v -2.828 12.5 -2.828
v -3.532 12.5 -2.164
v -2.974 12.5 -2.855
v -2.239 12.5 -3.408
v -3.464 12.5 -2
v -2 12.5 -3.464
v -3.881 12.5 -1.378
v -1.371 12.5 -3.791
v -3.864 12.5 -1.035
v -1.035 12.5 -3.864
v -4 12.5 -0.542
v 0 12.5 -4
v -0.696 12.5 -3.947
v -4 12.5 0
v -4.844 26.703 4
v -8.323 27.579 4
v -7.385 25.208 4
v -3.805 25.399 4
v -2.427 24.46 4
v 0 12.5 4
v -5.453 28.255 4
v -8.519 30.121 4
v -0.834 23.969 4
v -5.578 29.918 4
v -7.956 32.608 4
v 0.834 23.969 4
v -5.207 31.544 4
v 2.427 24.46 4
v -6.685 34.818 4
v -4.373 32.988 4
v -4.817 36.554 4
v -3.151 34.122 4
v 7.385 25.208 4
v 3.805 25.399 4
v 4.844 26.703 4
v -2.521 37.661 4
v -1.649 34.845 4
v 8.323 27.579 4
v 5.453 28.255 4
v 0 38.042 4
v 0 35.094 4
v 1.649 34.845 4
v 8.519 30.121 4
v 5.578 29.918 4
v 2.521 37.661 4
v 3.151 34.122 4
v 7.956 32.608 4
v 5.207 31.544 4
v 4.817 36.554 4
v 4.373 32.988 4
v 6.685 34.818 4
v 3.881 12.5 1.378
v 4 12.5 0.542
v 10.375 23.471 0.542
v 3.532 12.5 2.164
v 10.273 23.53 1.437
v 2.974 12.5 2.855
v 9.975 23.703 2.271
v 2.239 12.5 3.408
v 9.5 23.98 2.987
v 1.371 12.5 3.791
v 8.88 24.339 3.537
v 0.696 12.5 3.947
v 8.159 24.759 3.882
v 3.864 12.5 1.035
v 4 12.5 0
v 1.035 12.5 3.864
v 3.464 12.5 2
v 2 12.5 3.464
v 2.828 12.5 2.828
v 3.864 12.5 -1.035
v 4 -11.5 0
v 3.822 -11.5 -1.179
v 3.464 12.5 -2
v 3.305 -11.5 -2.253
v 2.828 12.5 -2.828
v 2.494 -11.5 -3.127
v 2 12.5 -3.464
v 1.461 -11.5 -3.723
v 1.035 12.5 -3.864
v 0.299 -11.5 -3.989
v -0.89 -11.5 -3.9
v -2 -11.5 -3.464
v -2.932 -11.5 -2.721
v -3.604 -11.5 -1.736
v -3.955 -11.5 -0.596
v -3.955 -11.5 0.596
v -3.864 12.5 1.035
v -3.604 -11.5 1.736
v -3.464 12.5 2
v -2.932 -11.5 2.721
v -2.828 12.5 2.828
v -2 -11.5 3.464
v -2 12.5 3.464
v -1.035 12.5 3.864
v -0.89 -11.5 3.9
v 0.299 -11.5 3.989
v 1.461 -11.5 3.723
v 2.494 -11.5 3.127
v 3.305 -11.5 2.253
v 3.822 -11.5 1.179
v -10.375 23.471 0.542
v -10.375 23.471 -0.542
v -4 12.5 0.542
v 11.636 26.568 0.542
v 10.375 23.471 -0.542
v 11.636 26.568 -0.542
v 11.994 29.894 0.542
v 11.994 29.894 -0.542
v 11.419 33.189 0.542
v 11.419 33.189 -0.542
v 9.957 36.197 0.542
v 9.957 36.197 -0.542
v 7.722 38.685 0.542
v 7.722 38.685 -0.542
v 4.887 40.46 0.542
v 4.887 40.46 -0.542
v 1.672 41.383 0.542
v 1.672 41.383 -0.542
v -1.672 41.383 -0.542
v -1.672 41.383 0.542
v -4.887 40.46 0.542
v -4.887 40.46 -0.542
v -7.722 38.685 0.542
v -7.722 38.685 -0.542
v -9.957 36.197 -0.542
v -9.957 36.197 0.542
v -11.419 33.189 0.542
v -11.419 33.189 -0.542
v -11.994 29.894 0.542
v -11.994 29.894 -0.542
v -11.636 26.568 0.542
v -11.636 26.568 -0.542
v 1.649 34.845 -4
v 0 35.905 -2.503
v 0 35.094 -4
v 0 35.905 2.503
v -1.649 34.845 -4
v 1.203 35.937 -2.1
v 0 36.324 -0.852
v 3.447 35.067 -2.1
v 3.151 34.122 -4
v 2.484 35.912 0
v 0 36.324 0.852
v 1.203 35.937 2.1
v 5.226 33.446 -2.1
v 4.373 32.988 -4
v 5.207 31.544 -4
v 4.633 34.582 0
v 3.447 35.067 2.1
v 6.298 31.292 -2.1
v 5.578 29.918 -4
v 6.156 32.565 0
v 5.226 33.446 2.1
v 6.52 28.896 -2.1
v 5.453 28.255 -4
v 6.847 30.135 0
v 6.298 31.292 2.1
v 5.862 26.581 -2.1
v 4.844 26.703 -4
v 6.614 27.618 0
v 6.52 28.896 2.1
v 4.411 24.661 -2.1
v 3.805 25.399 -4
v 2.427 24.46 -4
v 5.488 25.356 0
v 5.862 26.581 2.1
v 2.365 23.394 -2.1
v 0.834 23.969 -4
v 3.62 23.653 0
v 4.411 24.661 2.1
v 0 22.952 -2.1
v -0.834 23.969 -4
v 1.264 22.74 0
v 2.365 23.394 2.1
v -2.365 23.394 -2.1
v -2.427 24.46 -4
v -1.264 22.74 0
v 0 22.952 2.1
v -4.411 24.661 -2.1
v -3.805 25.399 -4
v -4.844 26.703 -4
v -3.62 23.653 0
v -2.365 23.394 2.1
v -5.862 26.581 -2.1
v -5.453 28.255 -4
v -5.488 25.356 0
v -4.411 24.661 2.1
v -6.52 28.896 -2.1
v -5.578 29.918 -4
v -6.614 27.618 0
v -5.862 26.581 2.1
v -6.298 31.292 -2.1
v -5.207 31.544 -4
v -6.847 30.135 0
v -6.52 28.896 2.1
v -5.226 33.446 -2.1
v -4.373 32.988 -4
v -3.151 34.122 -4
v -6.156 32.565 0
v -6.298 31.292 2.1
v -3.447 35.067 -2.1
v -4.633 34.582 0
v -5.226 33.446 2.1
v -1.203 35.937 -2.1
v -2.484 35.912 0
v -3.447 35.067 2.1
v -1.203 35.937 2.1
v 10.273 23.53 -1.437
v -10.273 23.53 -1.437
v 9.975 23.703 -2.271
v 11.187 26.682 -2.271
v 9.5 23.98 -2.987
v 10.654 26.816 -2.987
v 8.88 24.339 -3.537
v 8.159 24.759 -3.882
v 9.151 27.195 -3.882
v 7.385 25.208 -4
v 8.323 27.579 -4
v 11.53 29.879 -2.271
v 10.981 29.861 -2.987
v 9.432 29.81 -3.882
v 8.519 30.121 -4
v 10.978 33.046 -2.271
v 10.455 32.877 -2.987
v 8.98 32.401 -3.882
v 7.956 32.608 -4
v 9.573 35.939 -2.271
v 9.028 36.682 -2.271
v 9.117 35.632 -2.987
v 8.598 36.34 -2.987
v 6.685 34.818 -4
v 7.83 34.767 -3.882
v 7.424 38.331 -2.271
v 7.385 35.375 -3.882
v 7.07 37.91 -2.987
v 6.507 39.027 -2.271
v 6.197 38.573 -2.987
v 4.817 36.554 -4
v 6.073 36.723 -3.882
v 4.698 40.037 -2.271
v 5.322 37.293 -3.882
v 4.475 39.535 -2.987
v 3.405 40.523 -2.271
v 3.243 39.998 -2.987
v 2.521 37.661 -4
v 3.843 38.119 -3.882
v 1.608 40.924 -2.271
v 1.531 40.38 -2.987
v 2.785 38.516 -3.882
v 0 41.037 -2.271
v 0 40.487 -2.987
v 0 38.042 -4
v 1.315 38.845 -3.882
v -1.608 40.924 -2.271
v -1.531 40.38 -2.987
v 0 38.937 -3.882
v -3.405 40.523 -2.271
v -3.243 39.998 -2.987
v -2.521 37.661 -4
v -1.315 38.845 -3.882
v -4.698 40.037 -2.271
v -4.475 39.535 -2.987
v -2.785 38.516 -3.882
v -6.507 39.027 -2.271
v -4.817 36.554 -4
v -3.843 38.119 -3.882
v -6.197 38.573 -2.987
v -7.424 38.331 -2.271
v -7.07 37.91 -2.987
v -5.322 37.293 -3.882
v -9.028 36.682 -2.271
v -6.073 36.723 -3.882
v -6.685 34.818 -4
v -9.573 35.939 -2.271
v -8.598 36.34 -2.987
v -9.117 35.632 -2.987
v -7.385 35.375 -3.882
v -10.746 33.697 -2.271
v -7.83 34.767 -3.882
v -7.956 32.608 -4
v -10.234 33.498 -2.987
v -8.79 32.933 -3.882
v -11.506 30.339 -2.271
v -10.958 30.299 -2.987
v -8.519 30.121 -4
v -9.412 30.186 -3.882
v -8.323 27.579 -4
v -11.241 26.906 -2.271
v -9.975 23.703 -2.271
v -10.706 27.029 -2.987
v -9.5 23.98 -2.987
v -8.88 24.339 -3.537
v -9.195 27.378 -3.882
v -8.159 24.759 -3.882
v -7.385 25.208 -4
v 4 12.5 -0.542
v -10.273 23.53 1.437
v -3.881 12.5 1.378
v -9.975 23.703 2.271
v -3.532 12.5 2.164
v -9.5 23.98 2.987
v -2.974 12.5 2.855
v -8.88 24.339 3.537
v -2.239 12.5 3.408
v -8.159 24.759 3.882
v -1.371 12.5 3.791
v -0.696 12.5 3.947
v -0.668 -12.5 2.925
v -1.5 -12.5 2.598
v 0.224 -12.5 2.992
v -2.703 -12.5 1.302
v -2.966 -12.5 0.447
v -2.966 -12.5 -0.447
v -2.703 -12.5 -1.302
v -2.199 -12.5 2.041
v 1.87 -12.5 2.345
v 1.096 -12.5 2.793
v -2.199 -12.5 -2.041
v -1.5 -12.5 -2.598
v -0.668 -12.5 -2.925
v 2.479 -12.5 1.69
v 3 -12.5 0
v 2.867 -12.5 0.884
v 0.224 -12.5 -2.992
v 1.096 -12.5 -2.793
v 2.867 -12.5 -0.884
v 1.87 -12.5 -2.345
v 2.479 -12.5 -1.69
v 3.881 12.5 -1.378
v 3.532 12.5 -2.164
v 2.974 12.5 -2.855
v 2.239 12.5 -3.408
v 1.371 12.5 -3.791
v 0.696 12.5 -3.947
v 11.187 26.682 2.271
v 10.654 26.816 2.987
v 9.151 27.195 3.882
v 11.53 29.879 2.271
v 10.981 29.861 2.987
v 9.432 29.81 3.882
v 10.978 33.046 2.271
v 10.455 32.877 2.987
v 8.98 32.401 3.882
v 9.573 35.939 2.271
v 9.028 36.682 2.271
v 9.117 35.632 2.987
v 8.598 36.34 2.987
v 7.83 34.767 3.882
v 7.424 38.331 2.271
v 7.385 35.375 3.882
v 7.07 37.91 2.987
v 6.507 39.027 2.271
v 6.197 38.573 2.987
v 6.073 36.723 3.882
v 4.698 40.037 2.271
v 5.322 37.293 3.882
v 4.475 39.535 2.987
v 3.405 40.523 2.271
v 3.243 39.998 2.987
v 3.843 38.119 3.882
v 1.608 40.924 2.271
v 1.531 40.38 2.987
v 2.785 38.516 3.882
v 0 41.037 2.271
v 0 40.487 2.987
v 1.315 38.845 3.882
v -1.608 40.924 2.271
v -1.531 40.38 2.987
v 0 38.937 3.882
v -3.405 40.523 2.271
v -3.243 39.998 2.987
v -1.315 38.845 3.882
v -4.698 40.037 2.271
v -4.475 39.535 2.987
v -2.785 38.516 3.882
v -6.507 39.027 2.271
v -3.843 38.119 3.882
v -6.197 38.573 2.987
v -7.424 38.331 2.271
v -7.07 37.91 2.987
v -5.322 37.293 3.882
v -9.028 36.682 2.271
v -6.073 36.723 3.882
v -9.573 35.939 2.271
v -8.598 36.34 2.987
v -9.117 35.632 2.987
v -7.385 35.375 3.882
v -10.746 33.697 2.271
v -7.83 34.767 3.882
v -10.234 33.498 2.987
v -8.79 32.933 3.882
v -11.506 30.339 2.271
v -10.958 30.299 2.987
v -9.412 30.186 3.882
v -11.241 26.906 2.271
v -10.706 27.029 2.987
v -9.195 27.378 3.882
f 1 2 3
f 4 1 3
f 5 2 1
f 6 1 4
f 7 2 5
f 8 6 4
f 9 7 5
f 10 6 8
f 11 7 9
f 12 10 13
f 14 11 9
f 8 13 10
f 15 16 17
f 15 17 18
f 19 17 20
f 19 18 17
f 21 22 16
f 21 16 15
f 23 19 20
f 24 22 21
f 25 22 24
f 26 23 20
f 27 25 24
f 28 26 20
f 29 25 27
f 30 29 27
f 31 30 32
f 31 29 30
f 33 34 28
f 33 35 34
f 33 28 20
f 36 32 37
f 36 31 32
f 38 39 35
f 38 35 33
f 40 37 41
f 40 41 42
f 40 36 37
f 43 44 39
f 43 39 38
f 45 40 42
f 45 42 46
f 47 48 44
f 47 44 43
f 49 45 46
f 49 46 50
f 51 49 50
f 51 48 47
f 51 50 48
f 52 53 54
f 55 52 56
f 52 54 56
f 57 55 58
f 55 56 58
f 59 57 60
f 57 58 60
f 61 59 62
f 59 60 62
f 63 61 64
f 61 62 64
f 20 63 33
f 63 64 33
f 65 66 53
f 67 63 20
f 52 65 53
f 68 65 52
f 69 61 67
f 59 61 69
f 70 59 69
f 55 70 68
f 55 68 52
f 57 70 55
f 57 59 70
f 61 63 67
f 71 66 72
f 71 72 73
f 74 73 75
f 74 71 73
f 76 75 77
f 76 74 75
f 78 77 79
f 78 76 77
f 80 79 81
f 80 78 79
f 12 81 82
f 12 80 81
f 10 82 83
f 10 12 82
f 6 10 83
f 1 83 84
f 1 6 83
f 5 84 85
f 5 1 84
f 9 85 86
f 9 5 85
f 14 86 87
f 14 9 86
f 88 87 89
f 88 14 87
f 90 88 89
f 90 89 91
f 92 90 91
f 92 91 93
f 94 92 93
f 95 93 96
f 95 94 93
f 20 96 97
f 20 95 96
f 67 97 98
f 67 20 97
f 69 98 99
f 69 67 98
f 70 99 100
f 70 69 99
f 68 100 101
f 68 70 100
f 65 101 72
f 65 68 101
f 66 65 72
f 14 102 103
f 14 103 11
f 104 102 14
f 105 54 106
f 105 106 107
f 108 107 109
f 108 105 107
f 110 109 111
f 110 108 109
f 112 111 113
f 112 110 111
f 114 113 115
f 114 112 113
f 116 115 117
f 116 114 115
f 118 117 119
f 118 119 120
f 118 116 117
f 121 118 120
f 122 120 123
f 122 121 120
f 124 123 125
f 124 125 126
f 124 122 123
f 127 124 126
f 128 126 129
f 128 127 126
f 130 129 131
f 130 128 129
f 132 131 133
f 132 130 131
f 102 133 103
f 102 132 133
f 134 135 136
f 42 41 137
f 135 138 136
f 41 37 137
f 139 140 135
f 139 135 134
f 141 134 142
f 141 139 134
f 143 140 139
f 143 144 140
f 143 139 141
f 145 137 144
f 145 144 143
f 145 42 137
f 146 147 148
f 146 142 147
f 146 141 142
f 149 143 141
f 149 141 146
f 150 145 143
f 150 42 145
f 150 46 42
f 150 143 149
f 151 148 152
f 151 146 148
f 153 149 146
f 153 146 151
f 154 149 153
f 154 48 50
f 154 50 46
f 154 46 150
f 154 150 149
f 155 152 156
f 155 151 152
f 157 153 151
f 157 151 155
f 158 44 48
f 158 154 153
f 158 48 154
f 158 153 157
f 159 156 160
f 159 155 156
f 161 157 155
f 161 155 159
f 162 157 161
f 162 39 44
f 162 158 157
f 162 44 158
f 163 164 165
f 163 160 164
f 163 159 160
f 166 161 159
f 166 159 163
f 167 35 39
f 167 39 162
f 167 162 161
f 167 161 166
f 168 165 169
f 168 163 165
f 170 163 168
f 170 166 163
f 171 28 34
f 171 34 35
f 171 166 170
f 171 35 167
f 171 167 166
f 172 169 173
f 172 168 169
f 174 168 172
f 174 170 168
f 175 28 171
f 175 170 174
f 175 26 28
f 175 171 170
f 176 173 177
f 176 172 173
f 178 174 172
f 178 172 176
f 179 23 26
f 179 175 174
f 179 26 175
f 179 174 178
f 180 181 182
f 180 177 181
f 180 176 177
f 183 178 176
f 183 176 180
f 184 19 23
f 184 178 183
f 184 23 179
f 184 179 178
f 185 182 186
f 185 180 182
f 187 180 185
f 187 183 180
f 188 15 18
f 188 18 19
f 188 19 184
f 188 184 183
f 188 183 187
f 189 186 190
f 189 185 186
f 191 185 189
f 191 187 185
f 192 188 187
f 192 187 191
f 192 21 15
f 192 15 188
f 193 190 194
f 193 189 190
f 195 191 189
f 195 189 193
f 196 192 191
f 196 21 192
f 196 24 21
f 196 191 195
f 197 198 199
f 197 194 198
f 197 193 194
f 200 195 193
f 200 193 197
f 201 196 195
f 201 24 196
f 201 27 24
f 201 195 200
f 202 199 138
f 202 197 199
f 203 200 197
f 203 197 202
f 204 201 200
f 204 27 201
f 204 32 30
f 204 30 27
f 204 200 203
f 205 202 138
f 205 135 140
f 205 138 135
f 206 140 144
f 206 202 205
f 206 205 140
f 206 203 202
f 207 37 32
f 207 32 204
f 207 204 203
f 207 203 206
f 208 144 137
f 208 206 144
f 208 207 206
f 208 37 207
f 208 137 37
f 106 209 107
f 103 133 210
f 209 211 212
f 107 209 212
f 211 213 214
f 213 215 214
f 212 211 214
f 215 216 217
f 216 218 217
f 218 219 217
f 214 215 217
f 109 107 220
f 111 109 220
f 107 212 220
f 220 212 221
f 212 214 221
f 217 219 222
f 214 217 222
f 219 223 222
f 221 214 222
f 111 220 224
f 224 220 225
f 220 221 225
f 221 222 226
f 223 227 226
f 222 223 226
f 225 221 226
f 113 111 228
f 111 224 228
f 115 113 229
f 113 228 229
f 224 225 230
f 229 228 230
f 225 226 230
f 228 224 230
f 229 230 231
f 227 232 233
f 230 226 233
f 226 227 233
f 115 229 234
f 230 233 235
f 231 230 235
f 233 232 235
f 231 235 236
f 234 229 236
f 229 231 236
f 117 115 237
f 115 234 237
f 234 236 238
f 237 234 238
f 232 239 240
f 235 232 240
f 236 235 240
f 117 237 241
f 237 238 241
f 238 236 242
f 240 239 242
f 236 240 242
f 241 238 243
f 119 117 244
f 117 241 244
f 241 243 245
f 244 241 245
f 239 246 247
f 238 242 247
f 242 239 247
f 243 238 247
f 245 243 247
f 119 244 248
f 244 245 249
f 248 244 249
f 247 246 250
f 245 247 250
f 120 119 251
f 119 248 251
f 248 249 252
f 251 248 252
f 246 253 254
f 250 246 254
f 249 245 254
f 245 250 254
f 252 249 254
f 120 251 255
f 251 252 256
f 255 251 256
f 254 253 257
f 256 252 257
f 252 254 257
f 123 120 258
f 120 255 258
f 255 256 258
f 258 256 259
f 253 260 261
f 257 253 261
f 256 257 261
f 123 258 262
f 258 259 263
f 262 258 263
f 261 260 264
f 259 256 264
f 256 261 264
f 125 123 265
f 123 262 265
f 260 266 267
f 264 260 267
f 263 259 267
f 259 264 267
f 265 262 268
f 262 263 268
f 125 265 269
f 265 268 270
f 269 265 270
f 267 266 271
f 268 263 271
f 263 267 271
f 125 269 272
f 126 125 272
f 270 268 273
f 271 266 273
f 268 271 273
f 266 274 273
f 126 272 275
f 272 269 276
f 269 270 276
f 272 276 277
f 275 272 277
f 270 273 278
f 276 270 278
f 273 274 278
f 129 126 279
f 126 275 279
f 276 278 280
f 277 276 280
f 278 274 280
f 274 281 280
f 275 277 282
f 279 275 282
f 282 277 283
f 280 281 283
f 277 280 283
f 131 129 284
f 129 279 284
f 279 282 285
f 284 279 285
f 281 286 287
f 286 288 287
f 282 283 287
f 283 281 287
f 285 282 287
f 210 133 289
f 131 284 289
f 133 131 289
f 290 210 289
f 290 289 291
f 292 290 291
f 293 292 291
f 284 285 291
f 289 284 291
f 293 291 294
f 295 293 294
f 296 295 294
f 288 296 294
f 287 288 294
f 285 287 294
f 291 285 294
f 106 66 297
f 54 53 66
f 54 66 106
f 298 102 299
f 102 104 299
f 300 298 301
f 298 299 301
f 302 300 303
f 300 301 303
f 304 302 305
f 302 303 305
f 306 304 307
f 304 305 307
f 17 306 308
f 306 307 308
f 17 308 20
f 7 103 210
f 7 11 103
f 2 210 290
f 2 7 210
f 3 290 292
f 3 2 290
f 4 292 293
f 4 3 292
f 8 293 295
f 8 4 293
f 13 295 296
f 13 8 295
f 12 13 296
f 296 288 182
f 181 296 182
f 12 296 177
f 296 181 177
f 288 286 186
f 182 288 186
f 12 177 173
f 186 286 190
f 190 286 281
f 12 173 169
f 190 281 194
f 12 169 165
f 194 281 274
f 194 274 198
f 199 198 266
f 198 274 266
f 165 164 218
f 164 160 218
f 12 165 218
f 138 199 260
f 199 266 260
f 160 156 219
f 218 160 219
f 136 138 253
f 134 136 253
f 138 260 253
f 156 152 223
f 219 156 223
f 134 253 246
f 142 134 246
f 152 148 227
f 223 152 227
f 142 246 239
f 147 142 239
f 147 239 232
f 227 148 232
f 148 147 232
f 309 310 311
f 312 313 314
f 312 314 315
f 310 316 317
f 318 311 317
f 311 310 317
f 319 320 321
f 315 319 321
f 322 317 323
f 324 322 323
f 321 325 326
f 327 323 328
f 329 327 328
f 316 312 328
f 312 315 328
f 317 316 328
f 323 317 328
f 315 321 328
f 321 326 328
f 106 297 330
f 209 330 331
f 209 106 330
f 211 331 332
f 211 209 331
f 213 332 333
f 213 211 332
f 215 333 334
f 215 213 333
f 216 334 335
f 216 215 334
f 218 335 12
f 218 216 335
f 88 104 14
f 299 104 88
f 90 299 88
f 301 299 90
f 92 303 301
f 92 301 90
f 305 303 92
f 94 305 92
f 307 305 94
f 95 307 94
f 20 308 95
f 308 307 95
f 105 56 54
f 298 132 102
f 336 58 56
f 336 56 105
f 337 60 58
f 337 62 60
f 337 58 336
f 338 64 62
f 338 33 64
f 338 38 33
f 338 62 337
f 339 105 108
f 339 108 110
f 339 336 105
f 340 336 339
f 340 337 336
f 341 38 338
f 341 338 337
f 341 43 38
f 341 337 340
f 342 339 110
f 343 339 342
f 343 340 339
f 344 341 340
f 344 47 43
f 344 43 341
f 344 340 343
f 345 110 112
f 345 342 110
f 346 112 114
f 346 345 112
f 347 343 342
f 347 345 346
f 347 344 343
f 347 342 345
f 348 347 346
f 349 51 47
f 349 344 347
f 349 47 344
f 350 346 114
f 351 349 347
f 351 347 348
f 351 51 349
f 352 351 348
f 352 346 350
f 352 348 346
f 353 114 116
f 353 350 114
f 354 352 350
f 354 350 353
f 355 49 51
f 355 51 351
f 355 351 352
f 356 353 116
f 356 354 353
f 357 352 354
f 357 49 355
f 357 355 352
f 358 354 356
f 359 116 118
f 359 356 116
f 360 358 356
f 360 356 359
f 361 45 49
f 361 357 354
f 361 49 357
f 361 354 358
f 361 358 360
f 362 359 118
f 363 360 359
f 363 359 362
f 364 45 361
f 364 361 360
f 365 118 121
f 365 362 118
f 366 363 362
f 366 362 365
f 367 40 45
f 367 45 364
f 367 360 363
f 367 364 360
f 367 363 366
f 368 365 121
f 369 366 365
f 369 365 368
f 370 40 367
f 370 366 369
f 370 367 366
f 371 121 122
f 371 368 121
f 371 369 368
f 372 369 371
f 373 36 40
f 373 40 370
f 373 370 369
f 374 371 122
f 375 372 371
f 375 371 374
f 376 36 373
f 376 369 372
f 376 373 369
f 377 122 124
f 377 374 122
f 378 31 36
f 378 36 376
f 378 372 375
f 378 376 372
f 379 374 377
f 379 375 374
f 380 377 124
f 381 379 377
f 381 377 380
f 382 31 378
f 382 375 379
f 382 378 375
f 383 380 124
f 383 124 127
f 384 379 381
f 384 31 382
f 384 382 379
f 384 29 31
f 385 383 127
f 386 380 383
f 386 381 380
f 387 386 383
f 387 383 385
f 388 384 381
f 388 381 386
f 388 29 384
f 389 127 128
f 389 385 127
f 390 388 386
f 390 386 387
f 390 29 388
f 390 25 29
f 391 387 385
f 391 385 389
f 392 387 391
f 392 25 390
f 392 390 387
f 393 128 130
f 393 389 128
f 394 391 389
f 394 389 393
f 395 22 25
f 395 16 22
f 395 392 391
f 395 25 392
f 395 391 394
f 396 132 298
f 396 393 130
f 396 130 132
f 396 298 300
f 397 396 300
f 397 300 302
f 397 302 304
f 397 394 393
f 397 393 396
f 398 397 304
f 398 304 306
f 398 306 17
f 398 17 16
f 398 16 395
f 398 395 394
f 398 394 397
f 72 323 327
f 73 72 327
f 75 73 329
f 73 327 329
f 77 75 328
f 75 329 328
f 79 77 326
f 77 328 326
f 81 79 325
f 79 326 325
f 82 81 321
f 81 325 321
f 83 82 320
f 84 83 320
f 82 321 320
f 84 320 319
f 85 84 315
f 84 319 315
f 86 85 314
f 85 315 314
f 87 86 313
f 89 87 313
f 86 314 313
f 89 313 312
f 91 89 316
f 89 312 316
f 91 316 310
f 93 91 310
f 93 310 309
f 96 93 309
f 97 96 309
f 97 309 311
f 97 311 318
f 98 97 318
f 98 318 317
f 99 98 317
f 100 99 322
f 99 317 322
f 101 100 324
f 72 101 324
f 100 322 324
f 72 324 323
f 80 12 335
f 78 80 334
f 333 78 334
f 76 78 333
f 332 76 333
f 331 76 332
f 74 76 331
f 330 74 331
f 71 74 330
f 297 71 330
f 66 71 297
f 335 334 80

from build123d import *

# Parameters (mm, degrees)
SKETCH1_R           = 4
BOSS_EXTRUDE1_DEPTH = 12.5
BOSS_EXTRUDE6_DEPTH = 4
CHAMFER1_SIZE       = 1
FILLET6_R           = 3.4584


with BuildPart() as part:
    # Sketch1 → Boss-Extrude1 (new body, symmetric)
    with BuildSketch(Plane(origin=(0, 0, 0), x_dir=(1, 0, 0), z_dir=(0, 1, 0))):
        Circle(SKETCH1_R)
    extrude(amount=BOSS_EXTRUDE1_DEPTH, both=True)

    # Sketch10 → Boss-Extrude6 (add, symmetric)
    with BuildSketch(Plane.XY):
        with BuildLine():
            Line((-10.37531088, 23.470661383), (-4, 12.5))
            Line((-4, 12.5), (4, 12.5))
            Line((4, 12.5), (10.37531088, 23.470661383))
            ThreePointArc((10.37531088, 23.470661383), (0, 41.5), (-10.37531088, 23.470661383))
        make_face()
    extrude(amount=BOSS_EXTRUDE6_DEPTH, both=True)

    # Chamfer1
    chamfer1_edges = [part.edges().sort_by_distance(p)[0] for p in [
        (-4, -12.5, 0),
    ]]
    chamfer(chamfer1_edges, length=CHAMFER1_SIZE)

    # Sketch11 → Cut-Revolve1 (revolve, cut)
    with BuildSketch(Plane(origin=(0, 0, 0), x_dir=(0, 0, -1), z_dir=(1, 0, 0))):
        with BuildLine():
            Line((-4.5, 29.5), (4.5, 29.5))
            Line((4.5, 29.5), (4.5, 34.7))
            ThreePointArc((4.5, 34.7), (0, 36.376772499), (-4.5, 34.7))
            Line((-4.5, 34.7), (-4.5, 29.5))
        make_face()
    revolve(axis=Axis((0, 29.5, 4.5), (0, 0, -1)), mode=Mode.SUBTRACT)

    # Fillet6
    fillet6_edges = [part.edges().sort_by_distance(p)[0] for p in [
        (-7.18765544, 17.985330692, 4),
        (0, 41.5, 4),
        (7.18765544, 17.985330692, 4),
        (7.18765544, 17.985330692, -4),
        (0, 41.5, -4),
        (-7.18765544, 17.985330692, -4),
    ]]
    fillet(fillet6_edges, radius=FILLET6_R)


solid = part.part
